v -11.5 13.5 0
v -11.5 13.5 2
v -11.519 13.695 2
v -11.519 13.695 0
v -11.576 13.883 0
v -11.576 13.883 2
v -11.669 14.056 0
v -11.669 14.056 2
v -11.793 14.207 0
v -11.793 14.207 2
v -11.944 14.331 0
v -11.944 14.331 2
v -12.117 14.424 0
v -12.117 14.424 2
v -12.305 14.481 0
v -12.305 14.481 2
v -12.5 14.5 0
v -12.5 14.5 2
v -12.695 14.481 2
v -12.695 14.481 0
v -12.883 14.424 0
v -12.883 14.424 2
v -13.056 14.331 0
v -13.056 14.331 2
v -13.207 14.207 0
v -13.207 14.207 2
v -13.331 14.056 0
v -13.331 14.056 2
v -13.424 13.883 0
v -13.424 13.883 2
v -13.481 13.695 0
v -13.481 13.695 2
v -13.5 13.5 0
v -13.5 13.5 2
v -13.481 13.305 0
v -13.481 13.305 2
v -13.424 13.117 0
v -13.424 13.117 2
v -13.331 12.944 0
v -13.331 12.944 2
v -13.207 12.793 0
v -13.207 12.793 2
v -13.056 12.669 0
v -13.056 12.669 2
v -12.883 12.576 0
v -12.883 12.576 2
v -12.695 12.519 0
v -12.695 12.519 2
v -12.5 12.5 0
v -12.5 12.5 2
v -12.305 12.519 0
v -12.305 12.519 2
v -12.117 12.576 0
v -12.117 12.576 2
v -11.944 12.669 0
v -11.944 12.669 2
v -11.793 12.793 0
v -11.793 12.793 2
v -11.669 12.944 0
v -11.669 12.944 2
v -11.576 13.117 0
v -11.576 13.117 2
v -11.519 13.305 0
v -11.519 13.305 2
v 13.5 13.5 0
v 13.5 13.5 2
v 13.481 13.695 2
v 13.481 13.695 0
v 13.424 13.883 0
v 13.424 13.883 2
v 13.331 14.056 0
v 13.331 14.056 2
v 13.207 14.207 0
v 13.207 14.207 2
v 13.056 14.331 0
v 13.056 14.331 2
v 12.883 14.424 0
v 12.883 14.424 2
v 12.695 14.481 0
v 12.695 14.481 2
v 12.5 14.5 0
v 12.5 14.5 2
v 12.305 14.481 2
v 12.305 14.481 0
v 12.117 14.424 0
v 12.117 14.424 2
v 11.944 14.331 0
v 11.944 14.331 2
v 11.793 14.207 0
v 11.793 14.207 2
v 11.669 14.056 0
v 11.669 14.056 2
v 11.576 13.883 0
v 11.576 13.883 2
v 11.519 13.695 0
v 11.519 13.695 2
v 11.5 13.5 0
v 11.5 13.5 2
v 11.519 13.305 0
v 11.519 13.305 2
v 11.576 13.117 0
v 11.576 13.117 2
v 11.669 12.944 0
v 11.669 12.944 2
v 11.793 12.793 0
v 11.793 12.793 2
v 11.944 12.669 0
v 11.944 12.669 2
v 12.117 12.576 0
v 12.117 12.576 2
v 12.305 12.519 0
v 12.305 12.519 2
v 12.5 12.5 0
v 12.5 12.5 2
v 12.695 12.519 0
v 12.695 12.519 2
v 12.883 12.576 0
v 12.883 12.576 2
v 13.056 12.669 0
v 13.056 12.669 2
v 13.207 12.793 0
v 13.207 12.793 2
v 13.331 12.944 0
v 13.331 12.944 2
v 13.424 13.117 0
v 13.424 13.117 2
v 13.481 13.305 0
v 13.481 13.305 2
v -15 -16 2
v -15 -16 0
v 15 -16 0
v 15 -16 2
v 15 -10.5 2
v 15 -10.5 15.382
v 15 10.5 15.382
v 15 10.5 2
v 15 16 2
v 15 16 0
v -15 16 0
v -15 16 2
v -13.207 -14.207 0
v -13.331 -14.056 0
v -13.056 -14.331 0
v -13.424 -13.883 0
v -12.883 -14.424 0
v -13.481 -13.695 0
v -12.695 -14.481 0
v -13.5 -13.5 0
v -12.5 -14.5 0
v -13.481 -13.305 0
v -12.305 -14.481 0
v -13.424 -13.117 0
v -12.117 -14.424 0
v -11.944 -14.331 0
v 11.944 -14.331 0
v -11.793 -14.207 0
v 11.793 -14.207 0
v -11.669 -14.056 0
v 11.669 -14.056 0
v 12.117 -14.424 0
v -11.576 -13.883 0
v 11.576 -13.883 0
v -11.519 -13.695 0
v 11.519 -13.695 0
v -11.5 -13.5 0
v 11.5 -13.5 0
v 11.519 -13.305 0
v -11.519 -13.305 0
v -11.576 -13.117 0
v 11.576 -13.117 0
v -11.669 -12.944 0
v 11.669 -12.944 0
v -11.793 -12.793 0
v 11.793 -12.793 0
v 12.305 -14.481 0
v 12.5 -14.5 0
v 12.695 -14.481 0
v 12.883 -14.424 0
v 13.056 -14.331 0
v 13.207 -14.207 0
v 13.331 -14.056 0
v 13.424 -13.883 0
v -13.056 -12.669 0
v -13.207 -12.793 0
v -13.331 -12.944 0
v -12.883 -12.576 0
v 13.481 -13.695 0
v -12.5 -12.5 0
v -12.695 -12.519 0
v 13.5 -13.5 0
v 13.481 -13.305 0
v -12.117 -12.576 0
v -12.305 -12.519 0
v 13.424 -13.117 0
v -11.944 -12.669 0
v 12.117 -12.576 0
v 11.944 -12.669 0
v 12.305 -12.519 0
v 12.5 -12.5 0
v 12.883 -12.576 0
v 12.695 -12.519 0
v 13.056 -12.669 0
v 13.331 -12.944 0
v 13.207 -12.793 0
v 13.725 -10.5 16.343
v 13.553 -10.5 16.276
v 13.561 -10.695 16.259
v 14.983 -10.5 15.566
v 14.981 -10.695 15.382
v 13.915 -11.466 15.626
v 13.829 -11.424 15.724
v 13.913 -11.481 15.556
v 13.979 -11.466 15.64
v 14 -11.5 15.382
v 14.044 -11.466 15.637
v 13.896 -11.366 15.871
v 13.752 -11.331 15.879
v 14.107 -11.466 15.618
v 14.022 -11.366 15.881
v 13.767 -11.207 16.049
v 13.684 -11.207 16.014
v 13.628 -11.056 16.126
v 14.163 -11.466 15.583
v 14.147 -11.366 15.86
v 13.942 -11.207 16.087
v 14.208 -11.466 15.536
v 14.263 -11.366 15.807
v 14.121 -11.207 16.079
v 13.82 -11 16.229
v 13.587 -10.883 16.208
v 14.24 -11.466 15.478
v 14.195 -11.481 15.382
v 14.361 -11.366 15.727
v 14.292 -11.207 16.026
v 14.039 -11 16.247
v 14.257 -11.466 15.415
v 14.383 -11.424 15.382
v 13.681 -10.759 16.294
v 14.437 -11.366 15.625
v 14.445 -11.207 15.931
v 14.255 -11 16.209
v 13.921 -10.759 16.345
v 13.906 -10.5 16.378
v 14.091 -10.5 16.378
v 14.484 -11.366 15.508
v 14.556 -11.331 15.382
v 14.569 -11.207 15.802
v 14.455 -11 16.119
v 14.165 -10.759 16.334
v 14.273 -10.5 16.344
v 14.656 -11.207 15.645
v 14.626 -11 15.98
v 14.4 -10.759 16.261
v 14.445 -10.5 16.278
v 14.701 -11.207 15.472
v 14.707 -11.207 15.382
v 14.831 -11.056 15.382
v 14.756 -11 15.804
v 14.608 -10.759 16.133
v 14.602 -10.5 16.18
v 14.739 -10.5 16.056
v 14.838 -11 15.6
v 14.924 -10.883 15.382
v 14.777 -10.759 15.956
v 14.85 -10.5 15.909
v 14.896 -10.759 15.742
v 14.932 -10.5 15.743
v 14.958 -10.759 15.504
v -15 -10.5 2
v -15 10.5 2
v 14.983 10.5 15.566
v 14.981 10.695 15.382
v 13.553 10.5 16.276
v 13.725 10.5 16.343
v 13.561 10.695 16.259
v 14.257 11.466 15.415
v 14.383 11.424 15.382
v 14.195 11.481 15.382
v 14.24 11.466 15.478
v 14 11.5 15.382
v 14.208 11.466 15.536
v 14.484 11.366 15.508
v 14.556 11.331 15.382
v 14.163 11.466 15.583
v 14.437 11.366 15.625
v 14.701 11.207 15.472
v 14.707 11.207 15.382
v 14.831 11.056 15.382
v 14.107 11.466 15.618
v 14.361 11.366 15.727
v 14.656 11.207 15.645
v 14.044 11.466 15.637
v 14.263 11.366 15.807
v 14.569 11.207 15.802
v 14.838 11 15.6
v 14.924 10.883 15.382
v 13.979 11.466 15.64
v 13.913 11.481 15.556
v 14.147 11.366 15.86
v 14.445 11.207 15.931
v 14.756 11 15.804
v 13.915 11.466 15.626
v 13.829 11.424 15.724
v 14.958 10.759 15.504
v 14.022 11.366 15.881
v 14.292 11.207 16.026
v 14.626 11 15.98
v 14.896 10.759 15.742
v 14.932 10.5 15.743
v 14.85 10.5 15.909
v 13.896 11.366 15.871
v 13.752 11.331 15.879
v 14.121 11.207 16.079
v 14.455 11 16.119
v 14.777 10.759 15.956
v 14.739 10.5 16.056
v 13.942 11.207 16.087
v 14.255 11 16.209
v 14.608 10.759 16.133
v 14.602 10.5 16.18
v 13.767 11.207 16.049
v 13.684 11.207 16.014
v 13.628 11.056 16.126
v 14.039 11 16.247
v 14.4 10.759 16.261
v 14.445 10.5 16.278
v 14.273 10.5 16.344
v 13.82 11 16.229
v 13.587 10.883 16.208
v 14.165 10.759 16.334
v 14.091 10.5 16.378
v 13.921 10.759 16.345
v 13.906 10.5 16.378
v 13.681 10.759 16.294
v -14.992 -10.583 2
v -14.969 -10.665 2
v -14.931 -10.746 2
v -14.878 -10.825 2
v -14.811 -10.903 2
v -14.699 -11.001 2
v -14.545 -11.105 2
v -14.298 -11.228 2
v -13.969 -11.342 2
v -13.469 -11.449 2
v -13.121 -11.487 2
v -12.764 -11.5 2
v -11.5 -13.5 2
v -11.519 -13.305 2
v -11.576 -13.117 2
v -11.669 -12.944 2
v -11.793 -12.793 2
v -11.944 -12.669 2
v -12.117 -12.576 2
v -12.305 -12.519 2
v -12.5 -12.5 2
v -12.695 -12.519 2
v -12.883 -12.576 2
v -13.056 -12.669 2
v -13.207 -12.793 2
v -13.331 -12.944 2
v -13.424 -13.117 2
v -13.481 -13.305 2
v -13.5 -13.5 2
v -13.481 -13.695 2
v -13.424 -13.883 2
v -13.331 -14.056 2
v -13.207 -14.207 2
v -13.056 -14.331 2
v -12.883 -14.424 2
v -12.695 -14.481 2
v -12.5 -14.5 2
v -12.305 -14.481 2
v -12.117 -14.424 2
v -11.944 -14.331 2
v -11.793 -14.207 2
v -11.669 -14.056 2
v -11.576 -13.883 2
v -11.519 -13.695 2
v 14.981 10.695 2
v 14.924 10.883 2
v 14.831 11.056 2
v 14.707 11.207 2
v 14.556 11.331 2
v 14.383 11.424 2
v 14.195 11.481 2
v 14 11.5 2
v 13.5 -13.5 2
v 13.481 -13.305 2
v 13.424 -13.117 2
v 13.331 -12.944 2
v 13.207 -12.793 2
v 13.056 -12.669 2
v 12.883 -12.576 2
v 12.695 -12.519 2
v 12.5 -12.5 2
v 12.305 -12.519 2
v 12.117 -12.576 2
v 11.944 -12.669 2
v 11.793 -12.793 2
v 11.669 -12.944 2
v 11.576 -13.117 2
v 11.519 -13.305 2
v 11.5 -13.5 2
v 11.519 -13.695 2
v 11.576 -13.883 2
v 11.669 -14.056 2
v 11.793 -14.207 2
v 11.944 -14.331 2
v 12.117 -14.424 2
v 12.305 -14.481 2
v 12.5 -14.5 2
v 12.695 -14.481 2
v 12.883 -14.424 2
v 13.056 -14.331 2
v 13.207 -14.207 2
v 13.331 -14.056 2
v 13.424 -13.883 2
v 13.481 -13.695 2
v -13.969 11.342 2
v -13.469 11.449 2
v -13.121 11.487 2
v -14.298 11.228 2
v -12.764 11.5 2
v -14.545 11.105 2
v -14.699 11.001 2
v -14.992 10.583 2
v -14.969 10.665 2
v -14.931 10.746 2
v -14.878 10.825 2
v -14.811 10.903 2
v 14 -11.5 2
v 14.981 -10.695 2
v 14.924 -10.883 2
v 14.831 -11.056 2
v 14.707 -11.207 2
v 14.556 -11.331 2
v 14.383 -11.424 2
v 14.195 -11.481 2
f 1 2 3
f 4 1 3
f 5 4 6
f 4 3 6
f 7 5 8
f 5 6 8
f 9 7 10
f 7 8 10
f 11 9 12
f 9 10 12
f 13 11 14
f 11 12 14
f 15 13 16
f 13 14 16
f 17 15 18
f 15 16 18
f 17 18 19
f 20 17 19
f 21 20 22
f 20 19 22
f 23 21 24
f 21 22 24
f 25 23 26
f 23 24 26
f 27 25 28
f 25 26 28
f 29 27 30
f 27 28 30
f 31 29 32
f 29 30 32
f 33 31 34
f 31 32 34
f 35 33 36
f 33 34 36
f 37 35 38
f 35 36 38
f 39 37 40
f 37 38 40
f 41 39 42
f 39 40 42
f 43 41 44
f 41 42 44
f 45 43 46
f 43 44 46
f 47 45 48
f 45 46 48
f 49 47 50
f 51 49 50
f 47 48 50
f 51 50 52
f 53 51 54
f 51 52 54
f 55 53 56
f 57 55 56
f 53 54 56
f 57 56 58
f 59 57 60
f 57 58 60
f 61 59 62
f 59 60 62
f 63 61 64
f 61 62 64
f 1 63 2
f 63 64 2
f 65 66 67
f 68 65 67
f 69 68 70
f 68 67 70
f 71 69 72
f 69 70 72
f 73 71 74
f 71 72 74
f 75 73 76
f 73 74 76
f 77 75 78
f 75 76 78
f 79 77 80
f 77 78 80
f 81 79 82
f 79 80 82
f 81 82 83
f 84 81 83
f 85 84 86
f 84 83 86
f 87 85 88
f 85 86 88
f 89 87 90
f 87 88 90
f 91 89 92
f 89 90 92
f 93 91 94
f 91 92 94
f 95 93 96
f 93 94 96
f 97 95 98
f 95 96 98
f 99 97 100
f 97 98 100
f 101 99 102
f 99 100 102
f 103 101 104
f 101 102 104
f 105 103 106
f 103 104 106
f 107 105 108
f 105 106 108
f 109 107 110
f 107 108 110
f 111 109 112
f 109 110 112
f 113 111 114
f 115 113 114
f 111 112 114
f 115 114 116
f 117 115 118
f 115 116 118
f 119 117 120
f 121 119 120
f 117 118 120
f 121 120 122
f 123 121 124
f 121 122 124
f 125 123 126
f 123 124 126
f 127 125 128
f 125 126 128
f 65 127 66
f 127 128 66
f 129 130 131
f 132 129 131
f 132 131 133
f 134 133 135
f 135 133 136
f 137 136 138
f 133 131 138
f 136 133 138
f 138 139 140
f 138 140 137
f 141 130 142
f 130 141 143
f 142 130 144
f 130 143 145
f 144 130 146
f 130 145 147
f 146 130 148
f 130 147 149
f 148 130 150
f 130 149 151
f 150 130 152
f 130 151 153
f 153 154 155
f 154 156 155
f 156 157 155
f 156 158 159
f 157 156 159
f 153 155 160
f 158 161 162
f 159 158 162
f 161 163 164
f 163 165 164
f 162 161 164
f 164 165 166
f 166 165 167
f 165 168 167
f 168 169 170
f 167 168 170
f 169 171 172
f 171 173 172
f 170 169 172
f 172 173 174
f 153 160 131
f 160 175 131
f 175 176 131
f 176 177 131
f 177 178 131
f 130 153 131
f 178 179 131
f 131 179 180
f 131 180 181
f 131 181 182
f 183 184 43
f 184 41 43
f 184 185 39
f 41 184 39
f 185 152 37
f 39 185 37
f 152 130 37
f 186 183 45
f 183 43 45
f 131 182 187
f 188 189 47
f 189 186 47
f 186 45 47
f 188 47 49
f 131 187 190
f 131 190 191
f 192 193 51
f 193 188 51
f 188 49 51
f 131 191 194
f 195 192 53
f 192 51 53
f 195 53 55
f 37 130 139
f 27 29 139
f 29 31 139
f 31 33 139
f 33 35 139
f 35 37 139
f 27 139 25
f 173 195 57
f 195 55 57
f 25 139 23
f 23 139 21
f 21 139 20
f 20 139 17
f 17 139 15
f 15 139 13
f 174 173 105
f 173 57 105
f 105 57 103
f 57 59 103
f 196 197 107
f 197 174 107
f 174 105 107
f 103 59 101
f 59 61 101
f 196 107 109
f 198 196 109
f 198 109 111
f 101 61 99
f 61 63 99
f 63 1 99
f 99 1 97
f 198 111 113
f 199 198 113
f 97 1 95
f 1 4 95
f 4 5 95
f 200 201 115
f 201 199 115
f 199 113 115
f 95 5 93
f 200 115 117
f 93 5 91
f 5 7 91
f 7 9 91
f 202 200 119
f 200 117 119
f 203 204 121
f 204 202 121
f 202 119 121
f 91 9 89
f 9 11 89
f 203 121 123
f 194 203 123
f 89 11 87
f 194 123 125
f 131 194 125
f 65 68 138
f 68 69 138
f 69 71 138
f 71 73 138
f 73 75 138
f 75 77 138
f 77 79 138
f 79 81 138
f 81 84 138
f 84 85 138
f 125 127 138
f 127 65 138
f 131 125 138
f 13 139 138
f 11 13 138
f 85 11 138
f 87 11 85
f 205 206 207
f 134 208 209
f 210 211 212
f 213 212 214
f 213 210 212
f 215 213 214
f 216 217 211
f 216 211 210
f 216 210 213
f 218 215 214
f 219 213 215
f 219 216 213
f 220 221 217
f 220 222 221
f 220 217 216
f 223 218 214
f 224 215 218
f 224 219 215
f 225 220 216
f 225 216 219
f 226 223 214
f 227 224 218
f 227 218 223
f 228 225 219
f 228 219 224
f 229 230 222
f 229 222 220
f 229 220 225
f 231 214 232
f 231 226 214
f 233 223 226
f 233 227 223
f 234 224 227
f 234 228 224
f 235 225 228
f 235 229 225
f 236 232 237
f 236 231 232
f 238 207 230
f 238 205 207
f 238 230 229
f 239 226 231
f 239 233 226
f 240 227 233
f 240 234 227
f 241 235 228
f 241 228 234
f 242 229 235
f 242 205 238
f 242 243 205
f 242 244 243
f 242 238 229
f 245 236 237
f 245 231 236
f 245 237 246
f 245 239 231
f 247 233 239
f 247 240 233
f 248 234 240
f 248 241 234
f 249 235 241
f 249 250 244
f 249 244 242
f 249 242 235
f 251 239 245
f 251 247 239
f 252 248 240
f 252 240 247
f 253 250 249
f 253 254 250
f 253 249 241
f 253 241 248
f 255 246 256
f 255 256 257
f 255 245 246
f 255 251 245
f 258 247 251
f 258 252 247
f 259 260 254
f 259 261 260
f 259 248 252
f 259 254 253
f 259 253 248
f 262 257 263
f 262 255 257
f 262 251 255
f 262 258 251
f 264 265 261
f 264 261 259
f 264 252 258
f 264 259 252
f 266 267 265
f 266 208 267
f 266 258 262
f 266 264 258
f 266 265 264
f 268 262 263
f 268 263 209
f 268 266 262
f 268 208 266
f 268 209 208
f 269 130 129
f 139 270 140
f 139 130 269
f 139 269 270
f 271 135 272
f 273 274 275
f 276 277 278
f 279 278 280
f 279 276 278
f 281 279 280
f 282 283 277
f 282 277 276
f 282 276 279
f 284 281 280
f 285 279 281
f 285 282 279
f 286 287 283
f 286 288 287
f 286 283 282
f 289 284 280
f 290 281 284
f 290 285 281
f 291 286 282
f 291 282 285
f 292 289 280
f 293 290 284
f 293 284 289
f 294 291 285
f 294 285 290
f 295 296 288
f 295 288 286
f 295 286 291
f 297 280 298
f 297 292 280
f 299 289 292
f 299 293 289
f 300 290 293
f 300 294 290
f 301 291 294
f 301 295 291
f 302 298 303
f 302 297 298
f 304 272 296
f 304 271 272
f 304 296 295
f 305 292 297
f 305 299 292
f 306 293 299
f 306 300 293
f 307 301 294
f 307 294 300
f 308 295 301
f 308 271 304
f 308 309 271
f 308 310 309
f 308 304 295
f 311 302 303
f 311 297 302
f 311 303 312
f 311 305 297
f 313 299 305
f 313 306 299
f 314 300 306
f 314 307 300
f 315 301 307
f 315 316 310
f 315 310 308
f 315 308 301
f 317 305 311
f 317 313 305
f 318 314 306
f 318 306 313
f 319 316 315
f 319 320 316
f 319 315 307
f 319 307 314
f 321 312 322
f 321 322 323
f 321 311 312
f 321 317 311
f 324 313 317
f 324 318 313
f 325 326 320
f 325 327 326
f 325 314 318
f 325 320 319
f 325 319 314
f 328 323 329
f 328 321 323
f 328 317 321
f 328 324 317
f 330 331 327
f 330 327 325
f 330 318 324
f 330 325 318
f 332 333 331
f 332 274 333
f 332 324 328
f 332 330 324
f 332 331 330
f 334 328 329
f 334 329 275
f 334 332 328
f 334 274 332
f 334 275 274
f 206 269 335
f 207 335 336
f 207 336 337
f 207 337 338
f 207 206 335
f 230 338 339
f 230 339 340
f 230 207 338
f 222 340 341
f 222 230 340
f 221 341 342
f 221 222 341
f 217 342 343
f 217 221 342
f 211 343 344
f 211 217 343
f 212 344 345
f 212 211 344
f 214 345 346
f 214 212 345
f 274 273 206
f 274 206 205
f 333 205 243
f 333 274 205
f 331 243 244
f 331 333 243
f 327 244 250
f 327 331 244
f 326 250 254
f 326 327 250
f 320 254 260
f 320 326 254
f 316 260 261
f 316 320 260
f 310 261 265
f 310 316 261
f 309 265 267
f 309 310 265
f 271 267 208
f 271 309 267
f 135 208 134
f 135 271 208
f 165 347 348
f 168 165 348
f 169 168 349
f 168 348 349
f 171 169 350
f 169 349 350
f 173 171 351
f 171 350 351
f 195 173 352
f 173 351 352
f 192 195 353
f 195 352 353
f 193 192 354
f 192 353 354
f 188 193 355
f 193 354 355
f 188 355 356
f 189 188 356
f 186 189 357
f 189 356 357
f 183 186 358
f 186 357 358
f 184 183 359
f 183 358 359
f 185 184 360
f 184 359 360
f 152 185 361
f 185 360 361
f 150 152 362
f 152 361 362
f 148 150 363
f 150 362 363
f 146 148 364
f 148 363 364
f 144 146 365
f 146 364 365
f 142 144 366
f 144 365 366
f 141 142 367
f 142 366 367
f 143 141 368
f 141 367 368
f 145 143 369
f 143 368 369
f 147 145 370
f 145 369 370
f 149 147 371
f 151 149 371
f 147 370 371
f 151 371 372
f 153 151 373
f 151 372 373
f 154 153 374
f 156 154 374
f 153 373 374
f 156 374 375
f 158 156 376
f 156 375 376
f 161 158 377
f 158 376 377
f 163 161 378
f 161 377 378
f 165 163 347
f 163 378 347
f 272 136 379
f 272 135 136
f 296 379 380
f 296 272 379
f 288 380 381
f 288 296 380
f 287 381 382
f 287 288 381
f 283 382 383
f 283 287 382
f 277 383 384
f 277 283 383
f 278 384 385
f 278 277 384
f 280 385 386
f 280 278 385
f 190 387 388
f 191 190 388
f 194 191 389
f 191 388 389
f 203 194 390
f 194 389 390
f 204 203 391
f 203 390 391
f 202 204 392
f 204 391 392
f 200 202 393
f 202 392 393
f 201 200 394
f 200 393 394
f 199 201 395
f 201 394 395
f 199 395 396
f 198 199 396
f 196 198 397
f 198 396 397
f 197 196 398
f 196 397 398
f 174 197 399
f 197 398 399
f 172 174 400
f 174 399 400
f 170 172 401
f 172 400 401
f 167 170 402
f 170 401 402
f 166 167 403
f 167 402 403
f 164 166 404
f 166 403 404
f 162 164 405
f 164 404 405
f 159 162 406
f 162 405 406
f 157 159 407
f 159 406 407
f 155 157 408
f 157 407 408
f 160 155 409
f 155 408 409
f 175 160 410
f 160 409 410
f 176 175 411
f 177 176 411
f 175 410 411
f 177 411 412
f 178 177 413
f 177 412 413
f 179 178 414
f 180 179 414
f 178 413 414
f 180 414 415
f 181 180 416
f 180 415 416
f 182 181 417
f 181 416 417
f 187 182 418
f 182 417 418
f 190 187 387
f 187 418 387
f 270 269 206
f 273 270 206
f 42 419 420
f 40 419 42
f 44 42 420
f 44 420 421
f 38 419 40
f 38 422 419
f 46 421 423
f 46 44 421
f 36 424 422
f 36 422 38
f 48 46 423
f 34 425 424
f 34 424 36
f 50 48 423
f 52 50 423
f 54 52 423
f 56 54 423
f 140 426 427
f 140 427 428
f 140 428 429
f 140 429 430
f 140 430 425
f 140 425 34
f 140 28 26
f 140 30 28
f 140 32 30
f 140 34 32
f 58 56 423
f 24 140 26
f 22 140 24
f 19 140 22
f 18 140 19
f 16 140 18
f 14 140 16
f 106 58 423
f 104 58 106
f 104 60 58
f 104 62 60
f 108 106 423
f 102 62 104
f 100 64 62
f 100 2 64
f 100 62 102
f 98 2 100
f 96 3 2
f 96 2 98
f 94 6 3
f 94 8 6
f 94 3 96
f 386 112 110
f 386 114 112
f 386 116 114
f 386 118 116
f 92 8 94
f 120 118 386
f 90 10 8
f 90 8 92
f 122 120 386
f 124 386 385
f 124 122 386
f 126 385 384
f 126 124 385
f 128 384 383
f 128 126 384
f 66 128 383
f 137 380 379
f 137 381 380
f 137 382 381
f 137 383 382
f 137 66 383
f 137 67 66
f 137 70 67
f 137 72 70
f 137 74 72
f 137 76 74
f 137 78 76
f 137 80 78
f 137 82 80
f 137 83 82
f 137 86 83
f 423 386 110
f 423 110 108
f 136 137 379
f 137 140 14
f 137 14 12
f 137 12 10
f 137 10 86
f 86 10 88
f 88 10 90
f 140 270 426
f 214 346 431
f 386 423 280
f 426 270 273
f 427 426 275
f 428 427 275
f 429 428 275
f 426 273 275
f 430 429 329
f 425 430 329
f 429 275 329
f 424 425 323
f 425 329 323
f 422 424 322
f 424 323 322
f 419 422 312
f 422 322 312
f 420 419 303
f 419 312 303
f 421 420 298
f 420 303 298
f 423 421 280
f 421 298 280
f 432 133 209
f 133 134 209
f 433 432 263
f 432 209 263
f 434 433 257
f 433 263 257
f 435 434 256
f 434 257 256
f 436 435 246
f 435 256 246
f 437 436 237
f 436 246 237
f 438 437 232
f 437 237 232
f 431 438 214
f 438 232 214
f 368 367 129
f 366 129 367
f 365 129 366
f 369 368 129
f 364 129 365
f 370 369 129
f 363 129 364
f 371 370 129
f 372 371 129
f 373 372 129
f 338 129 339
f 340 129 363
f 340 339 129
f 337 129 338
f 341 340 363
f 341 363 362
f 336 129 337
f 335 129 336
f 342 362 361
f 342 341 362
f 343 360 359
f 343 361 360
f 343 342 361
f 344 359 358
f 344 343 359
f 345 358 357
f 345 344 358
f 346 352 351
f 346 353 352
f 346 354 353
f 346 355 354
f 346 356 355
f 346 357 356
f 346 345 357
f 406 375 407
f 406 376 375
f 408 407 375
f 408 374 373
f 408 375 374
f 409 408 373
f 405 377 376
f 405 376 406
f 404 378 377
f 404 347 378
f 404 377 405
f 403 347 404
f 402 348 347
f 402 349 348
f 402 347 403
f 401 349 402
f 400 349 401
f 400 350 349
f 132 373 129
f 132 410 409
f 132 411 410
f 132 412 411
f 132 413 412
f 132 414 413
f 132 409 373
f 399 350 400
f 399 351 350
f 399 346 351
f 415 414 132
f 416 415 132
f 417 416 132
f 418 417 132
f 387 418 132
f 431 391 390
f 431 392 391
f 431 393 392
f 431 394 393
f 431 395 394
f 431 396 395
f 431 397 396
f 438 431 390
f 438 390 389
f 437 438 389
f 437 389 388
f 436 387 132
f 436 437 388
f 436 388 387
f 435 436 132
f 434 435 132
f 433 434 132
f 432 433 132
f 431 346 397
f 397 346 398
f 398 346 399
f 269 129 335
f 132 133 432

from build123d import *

# Parameters (mm, degrees)
F0_W     = 30
F0_H     = 32
F1_DEPTH = 2
F2_R     = 1
F3_DEPTH = 2
F4_W     = 30
F4_H     = 23
F5_DEPTH = 15
F7_DEPTH = 23
F8_R     = 1


with BuildPart() as f1:
    # F0 (on Top) → F1 (new body)
    with BuildSketch(Plane.XY):
        Rectangle(F0_W, F0_H)
    extrude(amount=F1_DEPTH)

    # F2 (on face) → F3 (cut)
    with BuildSketch(Plane.XY.offset(2)):
        with Locations((12.5, 13.5)):
            Circle(F2_R)
        with Locations((-12.5, 13.5)):
            Circle(F2_R)
        with Locations((-12.5, -13.5)):
            Circle(F2_R)
        with Locations((12.5, -13.5)):
            Circle(F2_R)
    extrude(amount=-F3_DEPTH, mode=Mode.SUBTRACT)

    # F4 (on face) → F5 (join)
    with BuildSketch(Plane.XY.offset(2)):
        Rectangle(F4_W, F4_H)
    extrude(amount=F5_DEPTH)

    # F6 (on face) → F7 (cut)
    with BuildSketch(Plane.XZ.offset(11.5)):
        Polygon((-15, 2), (15, 17), (-15, 17), align=None)
    extrude(amount=-F7_DEPTH, mode=Mode.SUBTRACT)

    # F8
    f8_edges = [f1.edges().sort_by_distance(p)[0] for p in [
        (15, -11.5, 9.5),
        (15, 0, 17),
        (0, -11.5, 9.5),
        (15, 11.5, 9.5),
        (0, 11.5, 9.5),
    ]]
    fillet(f8_edges, radius=F8_R)


solid = f1.part
